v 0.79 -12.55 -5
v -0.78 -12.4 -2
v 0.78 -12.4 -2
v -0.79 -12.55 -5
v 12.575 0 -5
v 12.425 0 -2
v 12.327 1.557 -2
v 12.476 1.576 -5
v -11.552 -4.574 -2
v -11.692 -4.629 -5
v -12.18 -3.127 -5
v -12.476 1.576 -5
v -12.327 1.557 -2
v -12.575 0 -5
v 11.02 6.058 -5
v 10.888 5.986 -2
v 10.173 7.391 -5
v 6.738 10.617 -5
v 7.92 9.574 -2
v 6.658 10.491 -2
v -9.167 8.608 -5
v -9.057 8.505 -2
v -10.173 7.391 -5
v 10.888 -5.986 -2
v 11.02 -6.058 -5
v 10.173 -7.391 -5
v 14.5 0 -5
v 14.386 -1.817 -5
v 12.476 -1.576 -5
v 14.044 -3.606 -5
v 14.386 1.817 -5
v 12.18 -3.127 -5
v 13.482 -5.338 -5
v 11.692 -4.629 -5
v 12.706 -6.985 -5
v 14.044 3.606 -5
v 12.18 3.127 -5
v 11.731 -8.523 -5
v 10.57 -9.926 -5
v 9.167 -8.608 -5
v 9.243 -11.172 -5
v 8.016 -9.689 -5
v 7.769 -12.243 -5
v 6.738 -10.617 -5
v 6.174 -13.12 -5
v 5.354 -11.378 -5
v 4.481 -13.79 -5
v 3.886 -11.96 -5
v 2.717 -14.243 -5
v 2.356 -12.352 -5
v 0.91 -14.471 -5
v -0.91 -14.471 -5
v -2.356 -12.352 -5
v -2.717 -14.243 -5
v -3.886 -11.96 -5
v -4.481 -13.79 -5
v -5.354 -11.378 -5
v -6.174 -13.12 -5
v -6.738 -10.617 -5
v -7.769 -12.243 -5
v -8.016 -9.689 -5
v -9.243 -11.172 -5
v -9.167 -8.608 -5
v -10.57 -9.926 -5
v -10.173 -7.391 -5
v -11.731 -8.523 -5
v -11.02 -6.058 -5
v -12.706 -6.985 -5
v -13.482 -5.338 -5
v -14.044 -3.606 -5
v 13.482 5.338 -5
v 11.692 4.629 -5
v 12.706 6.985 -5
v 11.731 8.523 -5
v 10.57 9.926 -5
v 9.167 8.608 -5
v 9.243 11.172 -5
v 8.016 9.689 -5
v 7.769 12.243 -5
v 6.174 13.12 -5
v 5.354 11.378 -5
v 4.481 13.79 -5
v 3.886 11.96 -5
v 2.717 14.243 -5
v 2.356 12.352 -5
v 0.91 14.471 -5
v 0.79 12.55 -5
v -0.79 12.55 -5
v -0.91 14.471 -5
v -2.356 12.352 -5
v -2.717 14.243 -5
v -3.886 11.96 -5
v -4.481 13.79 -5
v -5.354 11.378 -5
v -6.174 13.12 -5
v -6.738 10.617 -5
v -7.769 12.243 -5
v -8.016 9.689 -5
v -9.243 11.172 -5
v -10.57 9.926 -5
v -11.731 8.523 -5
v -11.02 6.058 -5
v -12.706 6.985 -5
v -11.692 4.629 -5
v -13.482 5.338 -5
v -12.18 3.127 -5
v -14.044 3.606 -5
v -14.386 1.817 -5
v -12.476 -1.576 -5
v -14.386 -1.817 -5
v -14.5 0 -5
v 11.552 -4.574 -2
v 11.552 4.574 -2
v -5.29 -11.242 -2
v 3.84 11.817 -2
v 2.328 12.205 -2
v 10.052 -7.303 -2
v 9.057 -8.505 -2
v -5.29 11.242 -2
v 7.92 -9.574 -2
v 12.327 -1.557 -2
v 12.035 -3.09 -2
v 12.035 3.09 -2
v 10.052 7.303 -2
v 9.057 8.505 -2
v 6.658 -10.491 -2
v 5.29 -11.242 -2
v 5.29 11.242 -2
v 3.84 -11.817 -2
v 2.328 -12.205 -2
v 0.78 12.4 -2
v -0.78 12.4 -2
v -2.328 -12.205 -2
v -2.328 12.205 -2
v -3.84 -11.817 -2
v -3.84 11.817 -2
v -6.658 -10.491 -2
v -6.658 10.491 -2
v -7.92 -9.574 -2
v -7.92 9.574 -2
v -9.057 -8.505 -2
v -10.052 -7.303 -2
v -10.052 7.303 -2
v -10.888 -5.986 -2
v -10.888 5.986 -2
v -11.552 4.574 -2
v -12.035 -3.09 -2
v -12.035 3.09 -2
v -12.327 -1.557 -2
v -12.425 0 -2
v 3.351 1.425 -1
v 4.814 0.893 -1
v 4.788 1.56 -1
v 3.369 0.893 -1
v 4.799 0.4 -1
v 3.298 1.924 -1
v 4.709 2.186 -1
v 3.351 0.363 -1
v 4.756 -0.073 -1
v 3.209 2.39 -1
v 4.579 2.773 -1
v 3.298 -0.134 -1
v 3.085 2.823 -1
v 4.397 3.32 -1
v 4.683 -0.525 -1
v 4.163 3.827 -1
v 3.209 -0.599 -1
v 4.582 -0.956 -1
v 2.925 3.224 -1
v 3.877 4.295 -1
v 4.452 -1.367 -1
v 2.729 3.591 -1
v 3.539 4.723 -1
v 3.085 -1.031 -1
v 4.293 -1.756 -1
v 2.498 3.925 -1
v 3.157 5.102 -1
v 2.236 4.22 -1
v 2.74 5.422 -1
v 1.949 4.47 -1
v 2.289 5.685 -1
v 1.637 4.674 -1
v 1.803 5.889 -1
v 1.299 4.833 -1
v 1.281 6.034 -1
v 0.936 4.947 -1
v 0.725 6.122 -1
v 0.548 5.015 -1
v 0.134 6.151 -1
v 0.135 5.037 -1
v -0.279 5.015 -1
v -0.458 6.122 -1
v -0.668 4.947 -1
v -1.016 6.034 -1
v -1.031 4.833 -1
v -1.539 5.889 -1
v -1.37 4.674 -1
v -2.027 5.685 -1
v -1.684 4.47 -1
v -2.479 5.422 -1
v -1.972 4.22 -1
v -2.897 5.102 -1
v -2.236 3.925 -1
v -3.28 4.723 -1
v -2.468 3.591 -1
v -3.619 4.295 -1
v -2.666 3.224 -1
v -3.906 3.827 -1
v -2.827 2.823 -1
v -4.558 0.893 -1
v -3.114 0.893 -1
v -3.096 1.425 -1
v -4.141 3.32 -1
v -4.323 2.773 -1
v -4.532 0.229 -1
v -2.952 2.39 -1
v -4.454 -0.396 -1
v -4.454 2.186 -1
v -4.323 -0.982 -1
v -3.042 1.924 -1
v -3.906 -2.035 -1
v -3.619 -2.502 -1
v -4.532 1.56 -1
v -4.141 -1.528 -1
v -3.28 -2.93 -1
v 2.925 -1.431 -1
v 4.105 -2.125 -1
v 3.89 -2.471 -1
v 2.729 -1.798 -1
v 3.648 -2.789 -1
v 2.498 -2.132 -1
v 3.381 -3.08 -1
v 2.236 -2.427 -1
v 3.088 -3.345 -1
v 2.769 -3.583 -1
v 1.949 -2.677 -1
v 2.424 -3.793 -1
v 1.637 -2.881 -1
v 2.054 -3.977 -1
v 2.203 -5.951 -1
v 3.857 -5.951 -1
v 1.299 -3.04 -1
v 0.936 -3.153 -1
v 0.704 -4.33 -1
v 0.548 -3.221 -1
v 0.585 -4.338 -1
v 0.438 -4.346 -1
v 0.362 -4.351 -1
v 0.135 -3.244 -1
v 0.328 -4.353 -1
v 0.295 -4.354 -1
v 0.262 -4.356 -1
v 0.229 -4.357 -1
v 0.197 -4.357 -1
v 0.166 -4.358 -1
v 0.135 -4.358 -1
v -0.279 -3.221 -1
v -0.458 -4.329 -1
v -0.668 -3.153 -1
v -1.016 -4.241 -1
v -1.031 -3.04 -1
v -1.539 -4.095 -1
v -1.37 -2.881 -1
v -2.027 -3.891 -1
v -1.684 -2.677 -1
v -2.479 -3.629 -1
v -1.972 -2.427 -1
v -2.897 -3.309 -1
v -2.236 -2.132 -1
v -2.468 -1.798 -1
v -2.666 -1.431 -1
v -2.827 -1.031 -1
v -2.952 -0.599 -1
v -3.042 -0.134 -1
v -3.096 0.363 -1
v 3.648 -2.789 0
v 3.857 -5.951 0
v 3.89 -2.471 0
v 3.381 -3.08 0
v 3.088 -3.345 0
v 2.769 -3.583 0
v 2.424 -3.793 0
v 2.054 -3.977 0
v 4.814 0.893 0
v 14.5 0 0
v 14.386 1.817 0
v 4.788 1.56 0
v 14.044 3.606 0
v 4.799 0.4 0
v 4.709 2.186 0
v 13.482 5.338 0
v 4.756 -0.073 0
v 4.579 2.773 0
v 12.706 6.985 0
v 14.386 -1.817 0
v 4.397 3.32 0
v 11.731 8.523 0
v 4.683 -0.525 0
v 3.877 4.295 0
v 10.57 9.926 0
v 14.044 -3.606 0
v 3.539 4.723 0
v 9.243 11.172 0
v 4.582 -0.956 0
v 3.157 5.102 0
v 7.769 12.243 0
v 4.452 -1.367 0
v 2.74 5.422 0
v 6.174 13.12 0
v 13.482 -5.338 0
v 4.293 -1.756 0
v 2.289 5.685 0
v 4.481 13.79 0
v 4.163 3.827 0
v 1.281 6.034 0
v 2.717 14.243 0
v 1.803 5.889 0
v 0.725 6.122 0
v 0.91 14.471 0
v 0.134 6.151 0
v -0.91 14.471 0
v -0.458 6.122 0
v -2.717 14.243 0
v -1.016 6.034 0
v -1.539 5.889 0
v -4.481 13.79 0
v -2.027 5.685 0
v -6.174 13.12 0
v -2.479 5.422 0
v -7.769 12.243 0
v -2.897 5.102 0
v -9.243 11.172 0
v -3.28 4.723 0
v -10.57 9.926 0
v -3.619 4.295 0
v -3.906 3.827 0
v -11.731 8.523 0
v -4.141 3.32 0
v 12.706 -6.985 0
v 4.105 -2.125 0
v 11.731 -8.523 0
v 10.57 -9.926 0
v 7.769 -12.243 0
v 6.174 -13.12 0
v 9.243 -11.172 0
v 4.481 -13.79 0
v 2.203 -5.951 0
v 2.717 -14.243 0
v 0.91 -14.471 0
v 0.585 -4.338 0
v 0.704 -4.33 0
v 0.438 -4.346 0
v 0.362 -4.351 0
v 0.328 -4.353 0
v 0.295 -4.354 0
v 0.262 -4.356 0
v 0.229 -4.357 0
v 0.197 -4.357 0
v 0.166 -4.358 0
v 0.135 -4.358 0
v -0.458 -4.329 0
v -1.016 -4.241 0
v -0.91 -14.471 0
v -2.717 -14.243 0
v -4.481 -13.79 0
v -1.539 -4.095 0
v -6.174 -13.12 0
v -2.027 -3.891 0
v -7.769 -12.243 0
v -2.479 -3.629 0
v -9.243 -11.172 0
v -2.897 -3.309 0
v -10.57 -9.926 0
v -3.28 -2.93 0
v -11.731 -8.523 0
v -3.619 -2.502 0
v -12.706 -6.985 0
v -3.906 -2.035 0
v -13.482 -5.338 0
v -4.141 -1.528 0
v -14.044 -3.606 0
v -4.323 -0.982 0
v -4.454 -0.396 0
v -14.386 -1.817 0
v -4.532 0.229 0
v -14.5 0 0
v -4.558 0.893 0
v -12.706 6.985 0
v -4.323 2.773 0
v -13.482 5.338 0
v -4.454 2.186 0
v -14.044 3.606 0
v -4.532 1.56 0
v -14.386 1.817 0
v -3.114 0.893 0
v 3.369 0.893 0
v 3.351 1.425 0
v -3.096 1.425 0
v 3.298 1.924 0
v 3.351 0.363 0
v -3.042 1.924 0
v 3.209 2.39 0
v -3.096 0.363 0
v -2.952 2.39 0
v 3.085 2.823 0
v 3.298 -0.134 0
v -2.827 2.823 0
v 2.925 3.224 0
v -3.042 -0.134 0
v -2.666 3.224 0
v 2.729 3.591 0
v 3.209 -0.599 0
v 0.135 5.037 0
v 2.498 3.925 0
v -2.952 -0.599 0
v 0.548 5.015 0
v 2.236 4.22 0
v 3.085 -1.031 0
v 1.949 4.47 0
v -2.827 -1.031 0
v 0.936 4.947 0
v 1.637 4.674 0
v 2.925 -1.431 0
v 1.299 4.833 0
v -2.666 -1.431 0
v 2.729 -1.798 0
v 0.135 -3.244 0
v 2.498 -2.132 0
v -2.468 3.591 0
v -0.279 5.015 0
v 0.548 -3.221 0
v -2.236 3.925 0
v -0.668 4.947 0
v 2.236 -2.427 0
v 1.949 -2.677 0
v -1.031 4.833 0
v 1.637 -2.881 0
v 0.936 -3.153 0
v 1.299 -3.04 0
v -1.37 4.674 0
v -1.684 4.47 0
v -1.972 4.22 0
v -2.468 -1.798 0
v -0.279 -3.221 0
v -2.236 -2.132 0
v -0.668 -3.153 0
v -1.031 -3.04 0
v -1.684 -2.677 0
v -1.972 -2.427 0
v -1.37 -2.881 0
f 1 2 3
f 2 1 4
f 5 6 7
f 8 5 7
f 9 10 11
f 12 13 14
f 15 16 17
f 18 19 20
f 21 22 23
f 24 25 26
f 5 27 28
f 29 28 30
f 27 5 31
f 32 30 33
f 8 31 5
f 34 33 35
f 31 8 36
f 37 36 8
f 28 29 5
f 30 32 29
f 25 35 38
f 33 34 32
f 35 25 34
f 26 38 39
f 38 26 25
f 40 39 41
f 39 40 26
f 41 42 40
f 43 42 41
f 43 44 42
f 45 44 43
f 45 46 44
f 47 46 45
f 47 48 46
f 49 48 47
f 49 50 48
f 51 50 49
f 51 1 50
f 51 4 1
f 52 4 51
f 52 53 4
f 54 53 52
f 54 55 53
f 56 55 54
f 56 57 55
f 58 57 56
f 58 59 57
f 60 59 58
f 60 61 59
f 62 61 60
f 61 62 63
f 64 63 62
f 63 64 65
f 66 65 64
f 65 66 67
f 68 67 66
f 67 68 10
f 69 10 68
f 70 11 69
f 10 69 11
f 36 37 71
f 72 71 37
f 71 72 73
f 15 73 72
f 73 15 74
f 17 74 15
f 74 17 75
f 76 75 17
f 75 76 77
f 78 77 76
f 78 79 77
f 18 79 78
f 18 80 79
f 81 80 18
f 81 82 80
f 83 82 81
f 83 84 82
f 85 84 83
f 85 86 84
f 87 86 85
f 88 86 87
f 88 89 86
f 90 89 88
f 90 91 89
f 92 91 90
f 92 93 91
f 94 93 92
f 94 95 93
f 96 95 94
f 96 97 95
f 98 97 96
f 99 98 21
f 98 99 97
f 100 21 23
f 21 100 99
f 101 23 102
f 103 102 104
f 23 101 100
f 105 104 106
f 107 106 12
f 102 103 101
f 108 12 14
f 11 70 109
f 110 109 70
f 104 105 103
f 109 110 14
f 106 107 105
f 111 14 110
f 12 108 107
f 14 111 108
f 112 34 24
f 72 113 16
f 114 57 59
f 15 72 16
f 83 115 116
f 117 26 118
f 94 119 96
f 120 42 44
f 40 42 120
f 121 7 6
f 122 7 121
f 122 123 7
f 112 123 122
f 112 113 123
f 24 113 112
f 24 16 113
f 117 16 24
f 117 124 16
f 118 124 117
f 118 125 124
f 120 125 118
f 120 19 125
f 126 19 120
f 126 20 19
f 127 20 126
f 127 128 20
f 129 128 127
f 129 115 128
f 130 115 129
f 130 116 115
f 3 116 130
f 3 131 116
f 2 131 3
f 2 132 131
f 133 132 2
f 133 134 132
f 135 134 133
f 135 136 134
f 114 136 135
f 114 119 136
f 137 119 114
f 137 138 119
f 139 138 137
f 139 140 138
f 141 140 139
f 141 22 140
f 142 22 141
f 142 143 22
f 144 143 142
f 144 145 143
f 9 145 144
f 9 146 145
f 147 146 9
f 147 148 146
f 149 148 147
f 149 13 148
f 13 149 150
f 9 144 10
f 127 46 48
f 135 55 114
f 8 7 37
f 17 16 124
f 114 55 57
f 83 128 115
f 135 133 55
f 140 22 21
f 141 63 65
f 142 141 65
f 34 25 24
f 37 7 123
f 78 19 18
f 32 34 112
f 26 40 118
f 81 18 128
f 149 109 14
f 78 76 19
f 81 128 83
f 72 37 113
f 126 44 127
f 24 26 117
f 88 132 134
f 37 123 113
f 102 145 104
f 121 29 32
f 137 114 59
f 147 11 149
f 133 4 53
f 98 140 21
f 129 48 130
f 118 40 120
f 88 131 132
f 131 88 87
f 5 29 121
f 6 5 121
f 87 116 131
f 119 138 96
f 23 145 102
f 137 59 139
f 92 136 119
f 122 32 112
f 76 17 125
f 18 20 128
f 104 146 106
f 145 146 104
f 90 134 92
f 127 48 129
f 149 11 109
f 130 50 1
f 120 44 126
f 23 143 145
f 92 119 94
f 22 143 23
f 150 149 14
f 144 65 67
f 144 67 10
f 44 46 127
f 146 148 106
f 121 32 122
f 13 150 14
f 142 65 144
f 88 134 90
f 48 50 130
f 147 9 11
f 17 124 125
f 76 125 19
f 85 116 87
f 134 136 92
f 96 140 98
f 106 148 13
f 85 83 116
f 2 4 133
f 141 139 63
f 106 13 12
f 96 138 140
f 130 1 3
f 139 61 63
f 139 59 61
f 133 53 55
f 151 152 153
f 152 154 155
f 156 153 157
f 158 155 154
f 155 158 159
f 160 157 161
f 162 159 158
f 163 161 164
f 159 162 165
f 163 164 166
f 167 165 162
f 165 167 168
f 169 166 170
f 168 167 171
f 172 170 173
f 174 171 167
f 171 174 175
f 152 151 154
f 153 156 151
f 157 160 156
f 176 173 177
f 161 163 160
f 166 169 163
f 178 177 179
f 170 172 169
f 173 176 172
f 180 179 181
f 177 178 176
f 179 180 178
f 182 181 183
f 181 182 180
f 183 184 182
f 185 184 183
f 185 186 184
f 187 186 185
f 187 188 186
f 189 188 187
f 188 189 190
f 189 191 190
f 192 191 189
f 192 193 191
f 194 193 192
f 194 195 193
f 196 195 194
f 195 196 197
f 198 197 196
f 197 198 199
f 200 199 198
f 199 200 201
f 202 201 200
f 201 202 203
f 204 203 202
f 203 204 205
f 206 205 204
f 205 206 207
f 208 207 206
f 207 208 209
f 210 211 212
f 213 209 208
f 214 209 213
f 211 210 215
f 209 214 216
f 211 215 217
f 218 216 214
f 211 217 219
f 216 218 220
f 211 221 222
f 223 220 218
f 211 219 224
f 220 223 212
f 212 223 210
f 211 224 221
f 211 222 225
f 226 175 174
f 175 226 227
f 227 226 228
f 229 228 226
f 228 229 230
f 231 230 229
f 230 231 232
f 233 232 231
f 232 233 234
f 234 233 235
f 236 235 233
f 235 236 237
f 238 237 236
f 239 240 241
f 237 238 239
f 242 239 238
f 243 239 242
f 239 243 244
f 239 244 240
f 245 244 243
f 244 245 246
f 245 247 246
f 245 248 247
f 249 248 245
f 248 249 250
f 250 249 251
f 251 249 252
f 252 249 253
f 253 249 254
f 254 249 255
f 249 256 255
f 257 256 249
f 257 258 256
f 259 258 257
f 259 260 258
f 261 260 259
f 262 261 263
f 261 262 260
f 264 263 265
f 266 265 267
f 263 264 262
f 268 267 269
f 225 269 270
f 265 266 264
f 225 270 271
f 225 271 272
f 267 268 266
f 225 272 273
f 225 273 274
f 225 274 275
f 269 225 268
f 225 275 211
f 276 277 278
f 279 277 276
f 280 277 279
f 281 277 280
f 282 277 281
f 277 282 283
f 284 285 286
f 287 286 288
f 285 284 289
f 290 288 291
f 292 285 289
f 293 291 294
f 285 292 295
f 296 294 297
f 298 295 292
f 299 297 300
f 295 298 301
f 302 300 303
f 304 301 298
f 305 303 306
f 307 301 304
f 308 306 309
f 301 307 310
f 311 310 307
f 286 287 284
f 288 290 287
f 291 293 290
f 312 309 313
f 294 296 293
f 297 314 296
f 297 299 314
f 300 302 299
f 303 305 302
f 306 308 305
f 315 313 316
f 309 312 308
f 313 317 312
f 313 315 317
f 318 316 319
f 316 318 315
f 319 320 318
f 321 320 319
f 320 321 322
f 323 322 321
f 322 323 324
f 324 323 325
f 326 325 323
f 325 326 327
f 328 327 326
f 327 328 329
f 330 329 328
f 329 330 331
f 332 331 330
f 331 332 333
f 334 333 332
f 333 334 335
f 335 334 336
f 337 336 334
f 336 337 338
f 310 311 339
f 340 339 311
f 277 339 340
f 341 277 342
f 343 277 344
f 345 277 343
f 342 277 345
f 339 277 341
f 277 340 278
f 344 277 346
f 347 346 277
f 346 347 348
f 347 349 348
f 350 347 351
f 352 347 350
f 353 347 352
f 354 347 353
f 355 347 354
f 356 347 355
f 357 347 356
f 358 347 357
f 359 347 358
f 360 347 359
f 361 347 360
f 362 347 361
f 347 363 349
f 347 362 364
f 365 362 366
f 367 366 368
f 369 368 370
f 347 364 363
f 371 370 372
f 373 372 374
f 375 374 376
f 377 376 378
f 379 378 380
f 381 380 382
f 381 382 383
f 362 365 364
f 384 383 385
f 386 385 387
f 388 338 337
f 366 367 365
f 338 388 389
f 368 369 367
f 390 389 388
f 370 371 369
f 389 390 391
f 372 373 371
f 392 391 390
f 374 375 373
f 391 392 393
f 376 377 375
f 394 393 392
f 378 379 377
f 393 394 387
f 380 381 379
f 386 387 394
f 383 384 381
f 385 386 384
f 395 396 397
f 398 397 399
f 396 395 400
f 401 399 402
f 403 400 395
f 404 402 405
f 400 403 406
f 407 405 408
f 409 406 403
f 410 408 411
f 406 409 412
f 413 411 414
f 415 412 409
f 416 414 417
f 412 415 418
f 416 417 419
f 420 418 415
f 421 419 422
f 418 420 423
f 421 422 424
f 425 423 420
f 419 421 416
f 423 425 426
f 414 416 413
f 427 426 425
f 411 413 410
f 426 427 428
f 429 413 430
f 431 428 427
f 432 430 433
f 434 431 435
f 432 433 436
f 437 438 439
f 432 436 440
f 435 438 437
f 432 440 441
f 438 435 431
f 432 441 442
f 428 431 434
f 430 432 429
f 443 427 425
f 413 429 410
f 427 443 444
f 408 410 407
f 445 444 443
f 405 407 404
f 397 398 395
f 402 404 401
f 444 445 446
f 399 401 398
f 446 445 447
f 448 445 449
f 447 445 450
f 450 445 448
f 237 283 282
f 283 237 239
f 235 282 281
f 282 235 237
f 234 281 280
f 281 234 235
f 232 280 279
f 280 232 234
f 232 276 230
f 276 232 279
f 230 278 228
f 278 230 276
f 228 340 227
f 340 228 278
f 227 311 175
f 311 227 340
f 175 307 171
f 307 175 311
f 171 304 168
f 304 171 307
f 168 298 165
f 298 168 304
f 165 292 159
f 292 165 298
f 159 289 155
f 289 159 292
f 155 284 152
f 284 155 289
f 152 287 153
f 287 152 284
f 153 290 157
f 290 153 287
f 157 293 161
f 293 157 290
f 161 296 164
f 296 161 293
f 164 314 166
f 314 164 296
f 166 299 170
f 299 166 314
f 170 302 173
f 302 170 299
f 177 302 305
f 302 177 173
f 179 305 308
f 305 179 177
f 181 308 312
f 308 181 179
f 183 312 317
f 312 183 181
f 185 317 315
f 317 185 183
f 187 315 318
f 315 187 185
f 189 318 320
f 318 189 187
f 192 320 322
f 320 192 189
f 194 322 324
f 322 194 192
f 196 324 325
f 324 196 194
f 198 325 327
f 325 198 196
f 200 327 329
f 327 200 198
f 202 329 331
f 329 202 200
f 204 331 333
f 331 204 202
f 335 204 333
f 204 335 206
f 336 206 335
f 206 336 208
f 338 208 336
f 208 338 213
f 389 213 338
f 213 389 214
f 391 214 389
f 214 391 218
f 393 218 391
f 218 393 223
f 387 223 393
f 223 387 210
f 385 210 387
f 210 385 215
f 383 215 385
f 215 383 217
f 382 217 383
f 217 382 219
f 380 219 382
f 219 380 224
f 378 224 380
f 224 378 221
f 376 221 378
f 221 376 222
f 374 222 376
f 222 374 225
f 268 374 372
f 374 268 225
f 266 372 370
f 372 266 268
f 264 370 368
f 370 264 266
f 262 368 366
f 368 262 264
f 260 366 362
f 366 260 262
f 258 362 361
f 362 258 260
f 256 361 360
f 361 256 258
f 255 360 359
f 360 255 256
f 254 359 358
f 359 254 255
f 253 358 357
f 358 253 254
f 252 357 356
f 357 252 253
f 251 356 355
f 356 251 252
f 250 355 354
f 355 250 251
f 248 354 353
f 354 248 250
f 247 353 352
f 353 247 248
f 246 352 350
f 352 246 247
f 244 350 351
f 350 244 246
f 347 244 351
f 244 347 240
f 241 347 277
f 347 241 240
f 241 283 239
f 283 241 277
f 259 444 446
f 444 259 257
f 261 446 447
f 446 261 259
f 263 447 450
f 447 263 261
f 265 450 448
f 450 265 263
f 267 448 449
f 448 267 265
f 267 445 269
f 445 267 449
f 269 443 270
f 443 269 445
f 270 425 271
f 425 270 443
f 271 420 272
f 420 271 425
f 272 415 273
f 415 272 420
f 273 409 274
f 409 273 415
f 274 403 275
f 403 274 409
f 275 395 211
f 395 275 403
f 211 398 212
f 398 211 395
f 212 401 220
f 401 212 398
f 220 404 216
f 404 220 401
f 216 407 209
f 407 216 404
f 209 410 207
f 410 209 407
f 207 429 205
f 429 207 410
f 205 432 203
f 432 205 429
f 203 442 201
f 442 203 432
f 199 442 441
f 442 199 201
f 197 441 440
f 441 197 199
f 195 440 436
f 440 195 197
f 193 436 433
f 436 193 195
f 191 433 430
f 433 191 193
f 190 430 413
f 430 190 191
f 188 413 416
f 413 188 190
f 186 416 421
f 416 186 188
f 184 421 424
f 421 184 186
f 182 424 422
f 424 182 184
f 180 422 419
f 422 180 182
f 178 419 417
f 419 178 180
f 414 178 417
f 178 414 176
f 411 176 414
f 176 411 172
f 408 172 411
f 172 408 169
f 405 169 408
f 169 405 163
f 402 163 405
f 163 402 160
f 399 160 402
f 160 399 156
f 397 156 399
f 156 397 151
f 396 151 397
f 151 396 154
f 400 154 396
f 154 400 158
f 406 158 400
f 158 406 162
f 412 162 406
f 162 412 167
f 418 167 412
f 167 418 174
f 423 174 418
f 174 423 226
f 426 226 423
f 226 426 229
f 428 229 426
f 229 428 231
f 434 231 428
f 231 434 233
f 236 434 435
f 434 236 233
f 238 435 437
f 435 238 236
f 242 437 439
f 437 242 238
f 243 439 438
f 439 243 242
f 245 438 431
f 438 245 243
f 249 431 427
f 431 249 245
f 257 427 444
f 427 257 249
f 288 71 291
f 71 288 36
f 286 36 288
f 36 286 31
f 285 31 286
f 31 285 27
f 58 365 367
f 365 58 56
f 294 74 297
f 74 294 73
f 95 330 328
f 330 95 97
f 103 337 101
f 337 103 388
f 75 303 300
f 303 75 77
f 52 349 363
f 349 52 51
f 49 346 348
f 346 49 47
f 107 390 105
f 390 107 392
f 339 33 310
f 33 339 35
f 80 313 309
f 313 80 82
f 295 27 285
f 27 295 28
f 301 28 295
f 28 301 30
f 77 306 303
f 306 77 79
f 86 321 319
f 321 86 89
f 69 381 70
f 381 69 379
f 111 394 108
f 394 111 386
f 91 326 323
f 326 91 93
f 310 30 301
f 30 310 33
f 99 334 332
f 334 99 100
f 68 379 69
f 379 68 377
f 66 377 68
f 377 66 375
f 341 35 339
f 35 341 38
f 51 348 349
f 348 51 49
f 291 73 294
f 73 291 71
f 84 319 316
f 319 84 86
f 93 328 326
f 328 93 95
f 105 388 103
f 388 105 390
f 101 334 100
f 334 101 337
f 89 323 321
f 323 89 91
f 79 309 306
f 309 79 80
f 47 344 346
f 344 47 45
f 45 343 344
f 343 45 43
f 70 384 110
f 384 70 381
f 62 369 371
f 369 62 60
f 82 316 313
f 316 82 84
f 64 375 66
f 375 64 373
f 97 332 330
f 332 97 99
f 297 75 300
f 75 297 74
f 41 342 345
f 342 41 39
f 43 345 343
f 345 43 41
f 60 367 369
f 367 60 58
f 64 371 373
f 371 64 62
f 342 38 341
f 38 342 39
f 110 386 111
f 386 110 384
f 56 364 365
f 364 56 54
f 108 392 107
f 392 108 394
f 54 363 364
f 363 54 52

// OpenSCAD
$fn = 50;

difference() {
	union() {
		translate(v = [0, 0, -5.0]) {
			cylinder(h = 5, r = 14.5);
		}
	}
	union() {
		#translate(v = [0, 0, -5.0]) {
			cylinder(h = 3, r1 = 12.575, r2 = 12.425);
		}
		translate(v = [0, 0, -1]) {
			linear_extrude(height = 1) {
				text(font = "Impact", halign = "center", size = 10, text = "Q", valign = "center");
			}
		}
	}
}
